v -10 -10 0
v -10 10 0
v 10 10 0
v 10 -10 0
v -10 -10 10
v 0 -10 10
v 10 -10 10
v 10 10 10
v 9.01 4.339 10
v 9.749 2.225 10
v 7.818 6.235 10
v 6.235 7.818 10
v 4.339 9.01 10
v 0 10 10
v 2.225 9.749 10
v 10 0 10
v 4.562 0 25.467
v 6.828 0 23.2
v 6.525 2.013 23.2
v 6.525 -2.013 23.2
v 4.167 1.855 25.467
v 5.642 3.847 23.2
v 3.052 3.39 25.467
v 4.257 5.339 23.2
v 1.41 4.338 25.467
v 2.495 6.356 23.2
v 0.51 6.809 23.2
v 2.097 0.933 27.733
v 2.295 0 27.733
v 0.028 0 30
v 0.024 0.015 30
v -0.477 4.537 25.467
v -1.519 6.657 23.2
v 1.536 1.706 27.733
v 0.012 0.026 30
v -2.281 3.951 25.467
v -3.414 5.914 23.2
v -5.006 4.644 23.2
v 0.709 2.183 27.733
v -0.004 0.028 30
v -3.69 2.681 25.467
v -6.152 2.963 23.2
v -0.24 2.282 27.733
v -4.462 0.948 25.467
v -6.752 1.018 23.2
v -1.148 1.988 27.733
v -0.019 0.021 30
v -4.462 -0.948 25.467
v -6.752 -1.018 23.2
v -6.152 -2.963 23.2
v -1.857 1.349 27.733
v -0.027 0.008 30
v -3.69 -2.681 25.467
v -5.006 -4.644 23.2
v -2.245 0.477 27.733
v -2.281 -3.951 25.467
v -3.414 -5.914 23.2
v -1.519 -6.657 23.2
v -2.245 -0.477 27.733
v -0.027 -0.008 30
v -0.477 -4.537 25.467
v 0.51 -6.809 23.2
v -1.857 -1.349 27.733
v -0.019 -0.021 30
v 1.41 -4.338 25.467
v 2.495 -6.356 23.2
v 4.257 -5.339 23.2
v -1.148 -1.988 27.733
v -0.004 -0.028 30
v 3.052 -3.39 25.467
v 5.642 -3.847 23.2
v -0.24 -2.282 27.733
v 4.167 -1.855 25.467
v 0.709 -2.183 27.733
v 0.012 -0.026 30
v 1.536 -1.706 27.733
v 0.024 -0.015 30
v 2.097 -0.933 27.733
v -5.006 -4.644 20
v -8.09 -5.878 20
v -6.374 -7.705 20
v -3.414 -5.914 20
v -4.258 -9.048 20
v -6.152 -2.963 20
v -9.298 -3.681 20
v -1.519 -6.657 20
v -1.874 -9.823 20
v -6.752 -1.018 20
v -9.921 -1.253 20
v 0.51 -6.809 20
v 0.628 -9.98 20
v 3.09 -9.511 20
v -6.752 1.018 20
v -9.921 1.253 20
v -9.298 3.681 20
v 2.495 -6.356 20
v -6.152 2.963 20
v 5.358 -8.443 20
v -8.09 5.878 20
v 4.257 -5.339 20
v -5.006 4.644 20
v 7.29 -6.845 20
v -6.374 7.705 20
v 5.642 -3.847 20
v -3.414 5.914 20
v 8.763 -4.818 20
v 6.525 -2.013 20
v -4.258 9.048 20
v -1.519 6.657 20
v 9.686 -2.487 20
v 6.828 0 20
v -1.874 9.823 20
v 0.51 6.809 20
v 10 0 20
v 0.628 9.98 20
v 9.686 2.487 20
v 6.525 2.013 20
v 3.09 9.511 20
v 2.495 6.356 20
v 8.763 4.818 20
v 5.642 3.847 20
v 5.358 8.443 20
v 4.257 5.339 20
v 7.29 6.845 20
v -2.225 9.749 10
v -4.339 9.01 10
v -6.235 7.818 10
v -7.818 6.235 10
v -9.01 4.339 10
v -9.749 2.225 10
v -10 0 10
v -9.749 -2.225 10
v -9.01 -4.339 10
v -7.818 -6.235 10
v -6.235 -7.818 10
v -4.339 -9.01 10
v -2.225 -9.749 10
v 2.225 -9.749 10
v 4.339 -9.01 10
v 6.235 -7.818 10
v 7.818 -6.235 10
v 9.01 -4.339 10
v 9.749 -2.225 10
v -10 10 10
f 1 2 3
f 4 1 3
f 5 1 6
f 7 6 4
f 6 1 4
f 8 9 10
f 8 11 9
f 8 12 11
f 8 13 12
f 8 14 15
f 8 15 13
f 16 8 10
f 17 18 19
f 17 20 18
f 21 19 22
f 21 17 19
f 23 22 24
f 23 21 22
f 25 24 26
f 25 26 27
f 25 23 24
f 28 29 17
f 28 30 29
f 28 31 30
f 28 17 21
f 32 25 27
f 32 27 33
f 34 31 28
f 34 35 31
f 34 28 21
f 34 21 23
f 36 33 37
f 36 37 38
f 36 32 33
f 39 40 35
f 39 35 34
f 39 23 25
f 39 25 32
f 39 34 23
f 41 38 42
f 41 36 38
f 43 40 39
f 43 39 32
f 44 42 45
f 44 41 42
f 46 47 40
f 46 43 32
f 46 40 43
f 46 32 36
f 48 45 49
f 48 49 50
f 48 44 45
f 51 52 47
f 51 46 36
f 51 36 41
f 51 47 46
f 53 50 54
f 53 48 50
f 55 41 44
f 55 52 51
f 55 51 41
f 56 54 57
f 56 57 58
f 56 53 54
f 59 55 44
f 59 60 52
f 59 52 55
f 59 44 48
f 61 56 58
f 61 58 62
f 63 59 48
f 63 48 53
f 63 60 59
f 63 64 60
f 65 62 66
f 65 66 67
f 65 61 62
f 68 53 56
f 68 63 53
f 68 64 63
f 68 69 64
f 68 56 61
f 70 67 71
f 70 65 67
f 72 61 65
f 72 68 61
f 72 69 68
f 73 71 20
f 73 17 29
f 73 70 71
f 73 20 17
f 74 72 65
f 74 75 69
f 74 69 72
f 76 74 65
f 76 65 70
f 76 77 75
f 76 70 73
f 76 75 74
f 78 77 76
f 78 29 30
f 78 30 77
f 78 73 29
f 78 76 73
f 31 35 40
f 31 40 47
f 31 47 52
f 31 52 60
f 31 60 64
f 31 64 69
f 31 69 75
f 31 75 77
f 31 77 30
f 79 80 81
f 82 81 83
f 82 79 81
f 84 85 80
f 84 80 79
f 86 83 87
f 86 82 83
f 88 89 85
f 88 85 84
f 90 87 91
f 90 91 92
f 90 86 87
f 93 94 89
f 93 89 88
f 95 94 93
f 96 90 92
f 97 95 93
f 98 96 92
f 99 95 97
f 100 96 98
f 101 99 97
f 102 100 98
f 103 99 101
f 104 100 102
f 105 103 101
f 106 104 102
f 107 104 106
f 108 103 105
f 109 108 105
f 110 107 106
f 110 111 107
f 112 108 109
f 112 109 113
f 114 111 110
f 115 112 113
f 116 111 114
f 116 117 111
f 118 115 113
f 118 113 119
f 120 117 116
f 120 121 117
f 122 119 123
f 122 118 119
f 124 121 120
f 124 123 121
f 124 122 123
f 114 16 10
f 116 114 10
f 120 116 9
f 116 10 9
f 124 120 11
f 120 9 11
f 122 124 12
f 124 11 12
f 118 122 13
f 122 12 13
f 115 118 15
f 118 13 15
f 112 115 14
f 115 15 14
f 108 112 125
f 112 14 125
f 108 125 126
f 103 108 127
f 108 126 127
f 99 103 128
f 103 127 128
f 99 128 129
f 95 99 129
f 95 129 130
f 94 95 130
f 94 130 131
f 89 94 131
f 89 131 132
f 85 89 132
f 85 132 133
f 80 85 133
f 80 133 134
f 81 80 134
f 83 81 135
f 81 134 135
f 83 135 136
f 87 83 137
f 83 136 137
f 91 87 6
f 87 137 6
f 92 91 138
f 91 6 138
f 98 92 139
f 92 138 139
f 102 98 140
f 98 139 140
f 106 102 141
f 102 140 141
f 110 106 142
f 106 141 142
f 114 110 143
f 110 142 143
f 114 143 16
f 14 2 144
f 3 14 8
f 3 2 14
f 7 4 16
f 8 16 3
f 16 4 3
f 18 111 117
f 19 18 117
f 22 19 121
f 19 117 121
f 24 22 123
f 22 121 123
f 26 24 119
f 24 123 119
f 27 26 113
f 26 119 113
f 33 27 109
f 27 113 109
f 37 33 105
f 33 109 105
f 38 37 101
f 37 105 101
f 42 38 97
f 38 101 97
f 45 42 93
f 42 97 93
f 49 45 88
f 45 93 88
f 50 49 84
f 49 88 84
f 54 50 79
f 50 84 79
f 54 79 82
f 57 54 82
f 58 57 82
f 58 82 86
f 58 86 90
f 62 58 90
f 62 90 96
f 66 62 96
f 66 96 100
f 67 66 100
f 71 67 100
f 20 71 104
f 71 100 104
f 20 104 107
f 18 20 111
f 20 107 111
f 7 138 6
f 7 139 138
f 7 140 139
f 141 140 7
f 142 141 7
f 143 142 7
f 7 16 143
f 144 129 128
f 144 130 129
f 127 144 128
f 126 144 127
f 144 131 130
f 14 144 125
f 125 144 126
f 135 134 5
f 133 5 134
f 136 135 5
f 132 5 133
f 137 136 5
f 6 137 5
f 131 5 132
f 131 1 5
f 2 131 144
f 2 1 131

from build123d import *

# Parameters (mm, degrees)
F0_W     = 20
F0_H     = 20
F1_DEPTH = 10
F2_R     = 10
F3_DEPTH = 10
F4_R     = 6.828336
F5_DEPTH = 10
F6_SIZE  = 6.8


with BuildPart() as f1:
    # F0 (on Top) → F1 (new body)
    with BuildSketch(Plane.XY):
        Rectangle(F0_W, F0_H)
    extrude(amount=F1_DEPTH)

    # F2 (on face) → F3 (join)
    with BuildSketch(Plane.XY.offset(10)):
        Circle(F2_R)
    extrude(amount=F3_DEPTH)

    # F4 (on face) → F5 (join)
    with BuildSketch(Plane.XY.offset(20)):
        Circle(F4_R)
    extrude(amount=F5_DEPTH)

    # F6
    f6_edges = [f1.edges().sort_by_distance(p)[0] for p in [
        (-6.828336, 0, 30),
    ]]
    chamfer(f6_edges, length=F6_SIZE)


solid = f1.part
